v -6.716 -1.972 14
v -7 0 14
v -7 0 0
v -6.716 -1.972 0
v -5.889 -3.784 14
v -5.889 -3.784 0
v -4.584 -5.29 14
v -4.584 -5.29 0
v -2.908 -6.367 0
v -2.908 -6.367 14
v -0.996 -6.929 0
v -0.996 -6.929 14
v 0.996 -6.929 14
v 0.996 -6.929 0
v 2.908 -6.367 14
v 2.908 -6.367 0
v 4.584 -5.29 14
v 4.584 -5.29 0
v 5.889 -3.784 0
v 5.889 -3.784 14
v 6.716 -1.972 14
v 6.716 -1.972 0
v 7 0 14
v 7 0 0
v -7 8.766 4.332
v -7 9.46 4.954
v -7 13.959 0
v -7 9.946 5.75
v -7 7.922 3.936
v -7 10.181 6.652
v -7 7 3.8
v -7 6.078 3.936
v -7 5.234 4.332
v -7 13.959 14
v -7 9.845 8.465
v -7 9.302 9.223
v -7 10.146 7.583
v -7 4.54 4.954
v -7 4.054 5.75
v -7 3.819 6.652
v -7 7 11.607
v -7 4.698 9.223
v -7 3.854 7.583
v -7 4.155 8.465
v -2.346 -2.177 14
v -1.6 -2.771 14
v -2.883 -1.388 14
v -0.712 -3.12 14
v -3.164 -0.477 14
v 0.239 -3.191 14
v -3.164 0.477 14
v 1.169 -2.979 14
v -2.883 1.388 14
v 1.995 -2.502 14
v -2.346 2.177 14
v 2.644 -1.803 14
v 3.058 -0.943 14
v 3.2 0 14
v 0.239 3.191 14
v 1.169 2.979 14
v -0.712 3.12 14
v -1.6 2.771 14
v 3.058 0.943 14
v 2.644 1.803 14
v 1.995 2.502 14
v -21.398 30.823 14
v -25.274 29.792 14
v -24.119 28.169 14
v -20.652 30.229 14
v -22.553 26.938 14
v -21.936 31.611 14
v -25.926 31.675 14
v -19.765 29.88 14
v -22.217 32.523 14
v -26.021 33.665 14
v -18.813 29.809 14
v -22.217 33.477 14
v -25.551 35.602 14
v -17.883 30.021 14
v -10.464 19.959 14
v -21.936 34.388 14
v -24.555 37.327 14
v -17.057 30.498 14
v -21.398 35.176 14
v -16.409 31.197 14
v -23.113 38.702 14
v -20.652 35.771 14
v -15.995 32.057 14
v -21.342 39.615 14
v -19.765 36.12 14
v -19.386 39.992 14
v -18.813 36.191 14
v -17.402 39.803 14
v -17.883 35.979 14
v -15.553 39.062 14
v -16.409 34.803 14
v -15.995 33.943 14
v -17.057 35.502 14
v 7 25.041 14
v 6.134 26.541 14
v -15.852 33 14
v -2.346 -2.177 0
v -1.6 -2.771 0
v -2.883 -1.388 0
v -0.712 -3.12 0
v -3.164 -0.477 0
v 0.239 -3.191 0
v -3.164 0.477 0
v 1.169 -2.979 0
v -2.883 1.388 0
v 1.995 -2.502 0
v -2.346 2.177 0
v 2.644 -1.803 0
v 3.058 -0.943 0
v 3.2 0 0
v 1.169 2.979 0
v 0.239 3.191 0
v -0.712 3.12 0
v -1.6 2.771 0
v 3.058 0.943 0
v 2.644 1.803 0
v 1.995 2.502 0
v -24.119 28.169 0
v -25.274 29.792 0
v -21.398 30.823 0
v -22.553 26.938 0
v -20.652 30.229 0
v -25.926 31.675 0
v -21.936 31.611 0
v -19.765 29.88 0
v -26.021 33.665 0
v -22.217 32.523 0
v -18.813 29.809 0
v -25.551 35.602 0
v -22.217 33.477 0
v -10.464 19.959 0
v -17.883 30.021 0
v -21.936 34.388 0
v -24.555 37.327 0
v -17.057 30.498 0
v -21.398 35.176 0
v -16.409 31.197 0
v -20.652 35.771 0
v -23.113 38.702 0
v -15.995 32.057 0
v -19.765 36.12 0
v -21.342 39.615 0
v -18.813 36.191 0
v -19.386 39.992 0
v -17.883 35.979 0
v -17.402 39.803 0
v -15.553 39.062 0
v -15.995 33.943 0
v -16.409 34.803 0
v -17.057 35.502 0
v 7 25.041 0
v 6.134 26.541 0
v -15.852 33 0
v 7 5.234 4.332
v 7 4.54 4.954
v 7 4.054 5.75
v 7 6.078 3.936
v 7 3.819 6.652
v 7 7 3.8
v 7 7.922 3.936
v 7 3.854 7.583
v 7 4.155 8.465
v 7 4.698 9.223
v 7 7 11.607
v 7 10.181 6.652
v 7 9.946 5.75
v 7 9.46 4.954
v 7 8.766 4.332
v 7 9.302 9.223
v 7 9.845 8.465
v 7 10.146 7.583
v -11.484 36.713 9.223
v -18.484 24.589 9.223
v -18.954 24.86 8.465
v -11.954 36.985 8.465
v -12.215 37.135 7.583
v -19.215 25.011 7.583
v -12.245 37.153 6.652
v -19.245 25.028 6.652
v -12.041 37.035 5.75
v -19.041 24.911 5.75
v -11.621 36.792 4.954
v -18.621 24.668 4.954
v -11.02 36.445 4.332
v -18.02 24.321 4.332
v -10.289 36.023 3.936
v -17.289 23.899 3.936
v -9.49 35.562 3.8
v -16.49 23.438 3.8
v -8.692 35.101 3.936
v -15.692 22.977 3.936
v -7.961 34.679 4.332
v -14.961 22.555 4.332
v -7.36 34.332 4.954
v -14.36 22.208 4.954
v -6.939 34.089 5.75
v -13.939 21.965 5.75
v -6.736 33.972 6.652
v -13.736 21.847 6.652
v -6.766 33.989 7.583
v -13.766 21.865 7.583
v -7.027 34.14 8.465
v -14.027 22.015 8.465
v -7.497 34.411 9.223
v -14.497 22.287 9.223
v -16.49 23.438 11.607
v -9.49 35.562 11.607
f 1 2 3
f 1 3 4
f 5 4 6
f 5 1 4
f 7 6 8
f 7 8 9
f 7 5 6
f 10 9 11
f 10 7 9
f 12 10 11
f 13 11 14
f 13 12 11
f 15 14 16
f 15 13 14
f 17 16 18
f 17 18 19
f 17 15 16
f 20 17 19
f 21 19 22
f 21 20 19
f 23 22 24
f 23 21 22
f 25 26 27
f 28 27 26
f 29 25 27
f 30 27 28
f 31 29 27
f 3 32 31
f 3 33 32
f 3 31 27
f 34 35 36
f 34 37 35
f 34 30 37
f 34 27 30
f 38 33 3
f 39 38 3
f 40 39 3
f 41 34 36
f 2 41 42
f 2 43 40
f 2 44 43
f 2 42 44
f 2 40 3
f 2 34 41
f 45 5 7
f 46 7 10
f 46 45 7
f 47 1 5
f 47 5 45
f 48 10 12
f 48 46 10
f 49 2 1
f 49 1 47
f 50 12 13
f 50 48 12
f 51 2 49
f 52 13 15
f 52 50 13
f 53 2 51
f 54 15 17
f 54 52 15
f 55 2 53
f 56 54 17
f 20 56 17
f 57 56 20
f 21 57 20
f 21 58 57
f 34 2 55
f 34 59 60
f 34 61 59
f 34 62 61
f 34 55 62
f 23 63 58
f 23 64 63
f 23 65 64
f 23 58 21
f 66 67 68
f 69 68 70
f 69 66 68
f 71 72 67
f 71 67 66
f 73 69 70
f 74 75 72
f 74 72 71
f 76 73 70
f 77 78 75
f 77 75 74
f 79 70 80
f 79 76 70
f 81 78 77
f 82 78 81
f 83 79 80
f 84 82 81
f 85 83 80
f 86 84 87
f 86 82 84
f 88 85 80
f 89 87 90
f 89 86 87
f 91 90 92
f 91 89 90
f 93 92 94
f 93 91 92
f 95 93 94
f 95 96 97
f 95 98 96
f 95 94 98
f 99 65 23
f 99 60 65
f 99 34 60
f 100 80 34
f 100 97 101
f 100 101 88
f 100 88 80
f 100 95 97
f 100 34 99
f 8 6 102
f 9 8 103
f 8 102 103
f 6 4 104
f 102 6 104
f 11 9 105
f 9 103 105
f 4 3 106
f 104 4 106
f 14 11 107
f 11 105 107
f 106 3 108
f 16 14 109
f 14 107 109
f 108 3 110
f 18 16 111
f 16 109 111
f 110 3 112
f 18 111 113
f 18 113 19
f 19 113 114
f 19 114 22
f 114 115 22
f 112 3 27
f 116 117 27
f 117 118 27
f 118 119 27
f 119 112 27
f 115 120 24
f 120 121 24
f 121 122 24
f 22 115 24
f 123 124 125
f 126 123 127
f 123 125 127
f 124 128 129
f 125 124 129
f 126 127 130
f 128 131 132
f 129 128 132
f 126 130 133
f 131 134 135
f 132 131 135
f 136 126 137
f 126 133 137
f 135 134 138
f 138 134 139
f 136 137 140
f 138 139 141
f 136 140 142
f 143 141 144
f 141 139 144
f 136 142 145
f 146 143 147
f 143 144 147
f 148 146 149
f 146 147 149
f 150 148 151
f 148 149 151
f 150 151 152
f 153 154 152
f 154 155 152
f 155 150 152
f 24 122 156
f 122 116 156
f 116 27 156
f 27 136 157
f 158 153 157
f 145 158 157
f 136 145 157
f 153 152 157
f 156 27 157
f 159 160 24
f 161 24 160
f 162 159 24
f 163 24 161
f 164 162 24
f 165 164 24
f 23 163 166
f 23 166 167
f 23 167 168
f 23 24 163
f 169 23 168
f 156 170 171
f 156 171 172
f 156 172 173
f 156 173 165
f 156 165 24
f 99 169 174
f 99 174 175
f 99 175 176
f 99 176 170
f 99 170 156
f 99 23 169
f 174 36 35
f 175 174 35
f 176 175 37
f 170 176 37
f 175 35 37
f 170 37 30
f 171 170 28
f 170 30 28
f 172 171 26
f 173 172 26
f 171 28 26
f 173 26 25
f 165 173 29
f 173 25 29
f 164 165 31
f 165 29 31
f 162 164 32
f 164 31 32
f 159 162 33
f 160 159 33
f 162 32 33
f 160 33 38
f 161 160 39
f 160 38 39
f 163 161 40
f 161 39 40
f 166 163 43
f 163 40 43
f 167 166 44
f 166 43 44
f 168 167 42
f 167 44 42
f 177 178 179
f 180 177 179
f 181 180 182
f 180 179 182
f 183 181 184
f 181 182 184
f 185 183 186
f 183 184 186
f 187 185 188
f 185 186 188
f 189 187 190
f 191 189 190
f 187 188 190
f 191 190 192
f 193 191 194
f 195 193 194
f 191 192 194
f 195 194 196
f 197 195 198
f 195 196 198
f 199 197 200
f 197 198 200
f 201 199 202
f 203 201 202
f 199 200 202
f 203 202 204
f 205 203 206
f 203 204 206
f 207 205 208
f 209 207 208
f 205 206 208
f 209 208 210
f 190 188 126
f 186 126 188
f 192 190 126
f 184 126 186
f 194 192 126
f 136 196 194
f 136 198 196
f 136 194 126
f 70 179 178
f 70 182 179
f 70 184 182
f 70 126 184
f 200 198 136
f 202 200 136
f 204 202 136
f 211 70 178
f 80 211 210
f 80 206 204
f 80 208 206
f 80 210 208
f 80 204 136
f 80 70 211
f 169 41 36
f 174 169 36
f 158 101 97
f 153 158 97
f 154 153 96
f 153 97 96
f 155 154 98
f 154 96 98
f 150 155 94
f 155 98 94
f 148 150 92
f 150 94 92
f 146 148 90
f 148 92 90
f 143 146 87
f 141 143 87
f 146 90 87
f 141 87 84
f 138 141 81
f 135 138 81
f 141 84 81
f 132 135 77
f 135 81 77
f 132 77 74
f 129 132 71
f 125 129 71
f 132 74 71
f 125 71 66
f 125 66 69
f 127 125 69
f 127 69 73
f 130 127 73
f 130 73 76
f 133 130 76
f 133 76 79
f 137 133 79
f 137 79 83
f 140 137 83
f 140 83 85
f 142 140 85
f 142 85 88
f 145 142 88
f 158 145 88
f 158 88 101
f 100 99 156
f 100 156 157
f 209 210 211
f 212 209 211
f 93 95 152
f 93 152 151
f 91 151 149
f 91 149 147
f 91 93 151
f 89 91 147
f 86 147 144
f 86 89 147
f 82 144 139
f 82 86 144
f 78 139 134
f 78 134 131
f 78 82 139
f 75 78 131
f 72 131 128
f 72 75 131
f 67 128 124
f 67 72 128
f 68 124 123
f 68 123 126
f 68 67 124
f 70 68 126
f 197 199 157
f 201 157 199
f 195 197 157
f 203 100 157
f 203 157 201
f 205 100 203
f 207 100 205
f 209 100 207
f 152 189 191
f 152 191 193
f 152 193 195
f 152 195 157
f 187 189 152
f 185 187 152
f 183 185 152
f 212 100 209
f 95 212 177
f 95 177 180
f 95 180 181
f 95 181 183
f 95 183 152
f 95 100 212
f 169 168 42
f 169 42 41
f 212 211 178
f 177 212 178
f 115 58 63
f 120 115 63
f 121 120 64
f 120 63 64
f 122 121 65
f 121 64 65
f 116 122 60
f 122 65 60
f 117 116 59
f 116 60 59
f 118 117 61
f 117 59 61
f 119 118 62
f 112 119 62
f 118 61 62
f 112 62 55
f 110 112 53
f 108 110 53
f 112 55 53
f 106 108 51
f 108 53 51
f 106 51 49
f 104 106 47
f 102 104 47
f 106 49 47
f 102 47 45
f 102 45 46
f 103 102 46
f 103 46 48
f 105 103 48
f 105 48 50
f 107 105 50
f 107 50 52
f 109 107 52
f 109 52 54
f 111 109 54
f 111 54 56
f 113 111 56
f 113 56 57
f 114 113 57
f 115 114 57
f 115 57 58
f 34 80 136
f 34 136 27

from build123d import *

# Parameters (mm, degrees)
BOSS_EXTRUDE1_DEPTH = 14
CUT_EXTRUDE1_DEPTH  = 46.814563472
CUT_EXTRUDE2_DEPTH  = 47.465040622
HOLE1_D             = 6.4
HOLE2_D             = 6.4


with BuildPart() as part:
    # Sketch1 → Boss-Extrude1 (new body)
    with BuildSketch(Plane.XY.offset(14)):
        with BuildLine():
            Line((7, 0), (7, 25.041451884))
            Line((7, 25.041451884), (6.133974596, 26.541451884))
            Line((6.133974596, 26.541451884), (-15.552558883, 39.062177826))
            ThreePointArc((-15.552558883, 39.062177826), (-25.11473671, 36.5), (-22.552558883, 26.937822174))
            Line((-22.552558883, 26.937822174), (-10.464101615, 19.958548116))
            Line((-10.464101615, 19.958548116), (-7, 13.958548116))
            Line((-7, 13.958548116), (-7, 0))
            ThreePointArc((-7, 0), (0, -7), (7, 0))
        make_face()
    extrude(amount=-BOSS_EXTRUDE1_DEPTH)

    # Sketch2 → Cut-Extrude1 (cut, through all)
    with BuildSketch(Plane(origin=(6.026279442, 10.437822174, 0), x_dir=(0.8660254037844398, -0.49999999999999806, 0), z_dir=(-0.499999999999998, -0.8660254037844397, 0))):
        with BuildLine():
            Line((-26, 11.606580927), (-28.301887361, 9.222906785))
            ThreePointArc((-28.301887361, 9.222906785), (-26, 3.8), (-23.698112639, 9.222906785))
            Line((-23.698112639, 9.222906785), (-26, 11.606580927))
        make_face()
    extrude(amount=-CUT_EXTRUDE1_DEPTH, mode=Mode.SUBTRACT)

    # Sketch3 → Cut-Extrude2 (cut, through all)
    with BuildSketch(Plane.ZY.offset(7)):
        with BuildLine():
            Line((9.222906785, 4.698112639), (11.606580927, 7))
            Line((11.606580927, 7), (9.222906785, 9.301887361))
            ThreePointArc((9.222906785, 9.301887361), (3.8, 7), (9.222906785, 4.698112639))
        make_face()
    extrude(amount=-CUT_EXTRUDE2_DEPTH, mode=Mode.SUBTRACT)

    # Hole1 (through all)
    with Locations(Plane(origin=(0, 0, 0), x_dir=(-1, 0, 0), z_dir=(0, 0, -1))):
        with Locations((0, 0)):
            Hole(HOLE1_D / 2)

    # Hole2 (through all)
    with Locations(Plane(origin=(0, 0, 0), x_dir=(-1, 0, 0), z_dir=(0, 0, -1))):
        with Locations((19.0525, 32.999898011)):
            Hole(HOLE2_D / 2)


solid = part.part
